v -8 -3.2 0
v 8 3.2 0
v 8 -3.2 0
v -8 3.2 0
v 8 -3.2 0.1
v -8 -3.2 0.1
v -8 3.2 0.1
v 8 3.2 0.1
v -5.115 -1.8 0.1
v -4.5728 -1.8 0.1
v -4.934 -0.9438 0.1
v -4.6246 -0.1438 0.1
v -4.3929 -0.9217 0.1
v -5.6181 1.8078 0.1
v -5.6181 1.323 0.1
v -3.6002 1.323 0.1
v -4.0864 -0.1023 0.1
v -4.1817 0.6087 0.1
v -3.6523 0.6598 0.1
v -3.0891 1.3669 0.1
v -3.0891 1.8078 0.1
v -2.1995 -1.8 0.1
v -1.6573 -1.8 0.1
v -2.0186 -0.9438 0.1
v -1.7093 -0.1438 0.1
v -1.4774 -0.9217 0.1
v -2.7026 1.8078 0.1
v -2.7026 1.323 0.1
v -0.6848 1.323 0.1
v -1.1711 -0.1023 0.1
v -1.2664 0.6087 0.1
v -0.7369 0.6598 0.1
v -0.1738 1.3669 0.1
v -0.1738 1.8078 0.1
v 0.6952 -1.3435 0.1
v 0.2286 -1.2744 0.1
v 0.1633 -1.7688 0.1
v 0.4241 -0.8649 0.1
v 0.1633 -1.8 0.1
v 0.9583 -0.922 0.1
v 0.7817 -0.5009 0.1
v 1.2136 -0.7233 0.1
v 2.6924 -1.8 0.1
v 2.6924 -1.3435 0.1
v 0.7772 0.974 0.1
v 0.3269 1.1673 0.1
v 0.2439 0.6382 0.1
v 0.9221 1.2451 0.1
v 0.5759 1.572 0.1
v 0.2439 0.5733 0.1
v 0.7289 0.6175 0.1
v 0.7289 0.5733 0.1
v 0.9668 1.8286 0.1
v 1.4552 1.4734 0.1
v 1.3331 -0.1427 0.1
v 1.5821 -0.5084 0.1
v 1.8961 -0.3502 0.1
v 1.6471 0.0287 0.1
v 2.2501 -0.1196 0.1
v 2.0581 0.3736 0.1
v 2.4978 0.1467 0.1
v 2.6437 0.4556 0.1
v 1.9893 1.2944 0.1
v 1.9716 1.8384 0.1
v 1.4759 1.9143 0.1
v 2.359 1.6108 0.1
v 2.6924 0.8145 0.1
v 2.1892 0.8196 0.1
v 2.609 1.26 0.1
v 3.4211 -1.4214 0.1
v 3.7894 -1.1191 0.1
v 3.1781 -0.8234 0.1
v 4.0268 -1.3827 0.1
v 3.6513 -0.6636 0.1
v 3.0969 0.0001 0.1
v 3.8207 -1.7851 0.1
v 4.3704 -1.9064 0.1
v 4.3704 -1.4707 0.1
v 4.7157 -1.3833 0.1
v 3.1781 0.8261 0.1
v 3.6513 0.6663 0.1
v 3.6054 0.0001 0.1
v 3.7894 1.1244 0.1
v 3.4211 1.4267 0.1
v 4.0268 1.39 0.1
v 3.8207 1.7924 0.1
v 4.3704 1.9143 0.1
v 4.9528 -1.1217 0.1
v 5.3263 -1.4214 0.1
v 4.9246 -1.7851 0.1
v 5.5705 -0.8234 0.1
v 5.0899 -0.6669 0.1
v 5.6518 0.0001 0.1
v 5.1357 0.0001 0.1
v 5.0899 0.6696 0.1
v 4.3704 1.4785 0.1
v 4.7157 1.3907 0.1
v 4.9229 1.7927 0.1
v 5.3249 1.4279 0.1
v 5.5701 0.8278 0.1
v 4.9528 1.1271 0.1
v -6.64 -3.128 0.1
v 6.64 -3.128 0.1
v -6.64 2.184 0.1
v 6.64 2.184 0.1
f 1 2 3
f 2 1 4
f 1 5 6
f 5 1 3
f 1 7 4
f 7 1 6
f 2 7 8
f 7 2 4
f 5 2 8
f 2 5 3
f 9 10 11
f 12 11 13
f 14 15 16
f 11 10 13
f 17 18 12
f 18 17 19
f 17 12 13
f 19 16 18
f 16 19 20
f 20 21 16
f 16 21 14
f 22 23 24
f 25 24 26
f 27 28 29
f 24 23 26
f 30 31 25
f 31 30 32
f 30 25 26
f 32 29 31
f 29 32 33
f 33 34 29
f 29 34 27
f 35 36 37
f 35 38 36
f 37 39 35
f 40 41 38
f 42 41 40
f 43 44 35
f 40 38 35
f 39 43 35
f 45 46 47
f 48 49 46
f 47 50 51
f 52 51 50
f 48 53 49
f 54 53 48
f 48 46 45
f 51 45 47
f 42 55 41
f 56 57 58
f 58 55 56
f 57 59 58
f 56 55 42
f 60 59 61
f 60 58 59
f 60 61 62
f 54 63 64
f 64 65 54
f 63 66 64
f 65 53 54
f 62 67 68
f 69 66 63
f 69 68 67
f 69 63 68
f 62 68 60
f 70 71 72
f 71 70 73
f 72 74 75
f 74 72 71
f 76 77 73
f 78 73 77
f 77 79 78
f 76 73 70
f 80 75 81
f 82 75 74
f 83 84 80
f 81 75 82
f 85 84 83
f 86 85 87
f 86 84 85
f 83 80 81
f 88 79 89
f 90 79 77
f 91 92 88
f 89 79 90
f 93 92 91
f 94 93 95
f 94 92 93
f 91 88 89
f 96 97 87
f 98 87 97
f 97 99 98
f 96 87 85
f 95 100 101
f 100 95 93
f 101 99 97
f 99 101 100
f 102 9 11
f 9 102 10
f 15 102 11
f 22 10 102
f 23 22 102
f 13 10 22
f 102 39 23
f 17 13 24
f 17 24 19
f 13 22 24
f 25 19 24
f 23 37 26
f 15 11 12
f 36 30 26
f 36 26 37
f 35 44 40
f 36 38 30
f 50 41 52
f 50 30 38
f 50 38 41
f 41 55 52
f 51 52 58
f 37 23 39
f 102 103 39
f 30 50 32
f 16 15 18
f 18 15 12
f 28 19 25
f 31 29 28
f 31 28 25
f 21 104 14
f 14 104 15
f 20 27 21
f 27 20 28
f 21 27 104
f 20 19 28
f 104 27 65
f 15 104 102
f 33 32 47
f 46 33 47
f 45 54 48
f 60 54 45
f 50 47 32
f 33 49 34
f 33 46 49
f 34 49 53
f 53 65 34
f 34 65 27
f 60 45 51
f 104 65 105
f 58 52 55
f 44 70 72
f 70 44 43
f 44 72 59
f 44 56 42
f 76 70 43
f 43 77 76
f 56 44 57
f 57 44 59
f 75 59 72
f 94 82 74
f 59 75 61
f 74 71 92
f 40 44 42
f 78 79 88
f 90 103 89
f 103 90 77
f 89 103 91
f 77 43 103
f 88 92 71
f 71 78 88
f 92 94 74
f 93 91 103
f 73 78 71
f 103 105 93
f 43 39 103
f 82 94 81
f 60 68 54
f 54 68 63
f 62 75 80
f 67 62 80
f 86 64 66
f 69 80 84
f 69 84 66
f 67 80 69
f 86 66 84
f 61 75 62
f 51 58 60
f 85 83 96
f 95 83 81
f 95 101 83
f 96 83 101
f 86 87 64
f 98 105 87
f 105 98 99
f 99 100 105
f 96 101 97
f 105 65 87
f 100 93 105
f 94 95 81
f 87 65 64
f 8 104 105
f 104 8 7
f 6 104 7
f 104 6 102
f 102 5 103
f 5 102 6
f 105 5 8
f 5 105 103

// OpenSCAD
// file: ../p/box5-12.scad
use <../lib.scad>
function ldraw_lib__box5_12() = [
// 0 Box with 5 Faces without Any Edges
// 0 Name: box5-12.dat
// 0 Author: Chris Dee [cwdee]
// 0 !LDRAW_ORG Primitive UPDATE 2009-02
// 0 !LICENSE Licensed under CC BY 2.0 and CC BY 4.0 : see CAreadme.txt
// 
// 0 BFC CERTIFY CCW
  [0,"BFC","CERTIFY"],
  [0,"BFC","CCW"],
// 
// 0 !HISTORY 2009-09-03 [PTadmin] Official Update 2009-02
// 
// 
// 4 16 1 1 1 1 1 -1 -1 1 -1 -1 1 1
  [4,16,1,1,1,1,1,-1,-1,1,-1,-1,1,1],
// 4 16 -1 0 1 1 0 1 1 1 1 -1 1 1
  [4,16,-1,0,1,1,0,1,1,1,1,-1,1,1],
// 4 16 -1 0 -1 -1 0 1 -1 1 1 -1 1 -1
  [4,16,-1,0,-1,-1,0,1,-1,1,1,-1,1,-1],
// 4 16 1 0 -1 -1 0 -1 -1 1 -1 1 1 -1
  [4,16,1,0,-1,-1,0,-1,-1,1,-1,1,1,-1],
// 4 16 1 0 1 1 0 -1 1 1 -1 1 1 1
  [4,16,1,0,1,1,0,-1,1,1,-1,1,1,1],
// 0
];
module ldraw_lib__box5_12(step=0, col=false, unit=2/5, alt=false, line=0.2, solid=!$preview)
    makepoly(ldraw_lib__box5_12(), step=step, col=col, unit=unit, alt=alt, line=line, solid=solid);
ldraw_lib__box5_12(line=0.2);
// main file
use <../lib.scad>
use <../p/box5-12.scad>
use <s/191895s01.scad>
function ldraw_lib__191895b() = [
// 0 Sticker  0.8 x  2 with White "7720"
// 0 Name: 191895b.dat
// 0 Author: Steffen [Steffen]
// 0 !LDRAW_ORG Part UPDATE 2012-01
// 0 !LICENSE Licensed under CC BY 2.0 and CC BY 4.0 : see CAreadme.txt
// 
// 0 BFC CERTIFY CCW
  [0,"BFC","CERTIFY"],
  [0,"BFC","CCW"],
// 
// 0 !HISTORY 2012-03-30 [PTadmin] Official Update 2012-01
// 
// 
// 1 16 0 -0.25 0 20 0 0 0 0.25 0 0 0 -8 box5-12.dat
  [1,16,0,-0.25,0,20,0,0,0,0.25,0,0,0,-8, ldraw_lib__box5_12()],
// 1 16 0 -0.25 -4.5 0.415 0 0 0 1 0 0 0 0.415 s\191895s01.dat
  [1,16,0,-0.25,-4.5,0.415,0,0,0,1,0,0,0,0.415, ldraw_lib__s__191895s01()],
// 4 16 -20 -0.25 8 -16.6 -0.25 5.46 16.6 -0.25 5.46 20 -0.25 8
  [4,16,-20,-0.25,8,-16.6,-0.25,5.46,16.6,-0.25,5.46,20,-0.25,8],
// 4 16 -16.6 -0.25 5.46 -20 -0.25 8 -20 -0.25 -8 -16.6 -0.25 -7.82
  [4,16,-16.6,-0.25,5.46,-20,-0.25,8,-20,-0.25,-8,-16.6,-0.25,-7.82],
// 4 16 -16.6 -0.25 -7.82 -20 -0.25 -8 20 -0.25 -8 16.6 -0.25 -7.82
  [4,16,-16.6,-0.25,-7.82,-20,-0.25,-8,20,-0.25,-8,16.6,-0.25,-7.82],
// 4 16 20 -0.25 8 16.6 -0.25 5.46 16.6 -0.25 -7.82 20 -0.25 -8
  [4,16,20,-0.25,8,16.6,-0.25,5.46,16.6,-0.25,-7.82,20,-0.25,-8],
// 0
];
module ldraw_lib__191895b(step=0, col=false, unit=2/5, alt=false, line=0.2, solid=!$preview)
    makepoly(ldraw_lib__191895b(), step=step, col=col, unit=unit, alt=alt, line=line, solid=solid);
ldraw_lib__191895b(line=0.2);
